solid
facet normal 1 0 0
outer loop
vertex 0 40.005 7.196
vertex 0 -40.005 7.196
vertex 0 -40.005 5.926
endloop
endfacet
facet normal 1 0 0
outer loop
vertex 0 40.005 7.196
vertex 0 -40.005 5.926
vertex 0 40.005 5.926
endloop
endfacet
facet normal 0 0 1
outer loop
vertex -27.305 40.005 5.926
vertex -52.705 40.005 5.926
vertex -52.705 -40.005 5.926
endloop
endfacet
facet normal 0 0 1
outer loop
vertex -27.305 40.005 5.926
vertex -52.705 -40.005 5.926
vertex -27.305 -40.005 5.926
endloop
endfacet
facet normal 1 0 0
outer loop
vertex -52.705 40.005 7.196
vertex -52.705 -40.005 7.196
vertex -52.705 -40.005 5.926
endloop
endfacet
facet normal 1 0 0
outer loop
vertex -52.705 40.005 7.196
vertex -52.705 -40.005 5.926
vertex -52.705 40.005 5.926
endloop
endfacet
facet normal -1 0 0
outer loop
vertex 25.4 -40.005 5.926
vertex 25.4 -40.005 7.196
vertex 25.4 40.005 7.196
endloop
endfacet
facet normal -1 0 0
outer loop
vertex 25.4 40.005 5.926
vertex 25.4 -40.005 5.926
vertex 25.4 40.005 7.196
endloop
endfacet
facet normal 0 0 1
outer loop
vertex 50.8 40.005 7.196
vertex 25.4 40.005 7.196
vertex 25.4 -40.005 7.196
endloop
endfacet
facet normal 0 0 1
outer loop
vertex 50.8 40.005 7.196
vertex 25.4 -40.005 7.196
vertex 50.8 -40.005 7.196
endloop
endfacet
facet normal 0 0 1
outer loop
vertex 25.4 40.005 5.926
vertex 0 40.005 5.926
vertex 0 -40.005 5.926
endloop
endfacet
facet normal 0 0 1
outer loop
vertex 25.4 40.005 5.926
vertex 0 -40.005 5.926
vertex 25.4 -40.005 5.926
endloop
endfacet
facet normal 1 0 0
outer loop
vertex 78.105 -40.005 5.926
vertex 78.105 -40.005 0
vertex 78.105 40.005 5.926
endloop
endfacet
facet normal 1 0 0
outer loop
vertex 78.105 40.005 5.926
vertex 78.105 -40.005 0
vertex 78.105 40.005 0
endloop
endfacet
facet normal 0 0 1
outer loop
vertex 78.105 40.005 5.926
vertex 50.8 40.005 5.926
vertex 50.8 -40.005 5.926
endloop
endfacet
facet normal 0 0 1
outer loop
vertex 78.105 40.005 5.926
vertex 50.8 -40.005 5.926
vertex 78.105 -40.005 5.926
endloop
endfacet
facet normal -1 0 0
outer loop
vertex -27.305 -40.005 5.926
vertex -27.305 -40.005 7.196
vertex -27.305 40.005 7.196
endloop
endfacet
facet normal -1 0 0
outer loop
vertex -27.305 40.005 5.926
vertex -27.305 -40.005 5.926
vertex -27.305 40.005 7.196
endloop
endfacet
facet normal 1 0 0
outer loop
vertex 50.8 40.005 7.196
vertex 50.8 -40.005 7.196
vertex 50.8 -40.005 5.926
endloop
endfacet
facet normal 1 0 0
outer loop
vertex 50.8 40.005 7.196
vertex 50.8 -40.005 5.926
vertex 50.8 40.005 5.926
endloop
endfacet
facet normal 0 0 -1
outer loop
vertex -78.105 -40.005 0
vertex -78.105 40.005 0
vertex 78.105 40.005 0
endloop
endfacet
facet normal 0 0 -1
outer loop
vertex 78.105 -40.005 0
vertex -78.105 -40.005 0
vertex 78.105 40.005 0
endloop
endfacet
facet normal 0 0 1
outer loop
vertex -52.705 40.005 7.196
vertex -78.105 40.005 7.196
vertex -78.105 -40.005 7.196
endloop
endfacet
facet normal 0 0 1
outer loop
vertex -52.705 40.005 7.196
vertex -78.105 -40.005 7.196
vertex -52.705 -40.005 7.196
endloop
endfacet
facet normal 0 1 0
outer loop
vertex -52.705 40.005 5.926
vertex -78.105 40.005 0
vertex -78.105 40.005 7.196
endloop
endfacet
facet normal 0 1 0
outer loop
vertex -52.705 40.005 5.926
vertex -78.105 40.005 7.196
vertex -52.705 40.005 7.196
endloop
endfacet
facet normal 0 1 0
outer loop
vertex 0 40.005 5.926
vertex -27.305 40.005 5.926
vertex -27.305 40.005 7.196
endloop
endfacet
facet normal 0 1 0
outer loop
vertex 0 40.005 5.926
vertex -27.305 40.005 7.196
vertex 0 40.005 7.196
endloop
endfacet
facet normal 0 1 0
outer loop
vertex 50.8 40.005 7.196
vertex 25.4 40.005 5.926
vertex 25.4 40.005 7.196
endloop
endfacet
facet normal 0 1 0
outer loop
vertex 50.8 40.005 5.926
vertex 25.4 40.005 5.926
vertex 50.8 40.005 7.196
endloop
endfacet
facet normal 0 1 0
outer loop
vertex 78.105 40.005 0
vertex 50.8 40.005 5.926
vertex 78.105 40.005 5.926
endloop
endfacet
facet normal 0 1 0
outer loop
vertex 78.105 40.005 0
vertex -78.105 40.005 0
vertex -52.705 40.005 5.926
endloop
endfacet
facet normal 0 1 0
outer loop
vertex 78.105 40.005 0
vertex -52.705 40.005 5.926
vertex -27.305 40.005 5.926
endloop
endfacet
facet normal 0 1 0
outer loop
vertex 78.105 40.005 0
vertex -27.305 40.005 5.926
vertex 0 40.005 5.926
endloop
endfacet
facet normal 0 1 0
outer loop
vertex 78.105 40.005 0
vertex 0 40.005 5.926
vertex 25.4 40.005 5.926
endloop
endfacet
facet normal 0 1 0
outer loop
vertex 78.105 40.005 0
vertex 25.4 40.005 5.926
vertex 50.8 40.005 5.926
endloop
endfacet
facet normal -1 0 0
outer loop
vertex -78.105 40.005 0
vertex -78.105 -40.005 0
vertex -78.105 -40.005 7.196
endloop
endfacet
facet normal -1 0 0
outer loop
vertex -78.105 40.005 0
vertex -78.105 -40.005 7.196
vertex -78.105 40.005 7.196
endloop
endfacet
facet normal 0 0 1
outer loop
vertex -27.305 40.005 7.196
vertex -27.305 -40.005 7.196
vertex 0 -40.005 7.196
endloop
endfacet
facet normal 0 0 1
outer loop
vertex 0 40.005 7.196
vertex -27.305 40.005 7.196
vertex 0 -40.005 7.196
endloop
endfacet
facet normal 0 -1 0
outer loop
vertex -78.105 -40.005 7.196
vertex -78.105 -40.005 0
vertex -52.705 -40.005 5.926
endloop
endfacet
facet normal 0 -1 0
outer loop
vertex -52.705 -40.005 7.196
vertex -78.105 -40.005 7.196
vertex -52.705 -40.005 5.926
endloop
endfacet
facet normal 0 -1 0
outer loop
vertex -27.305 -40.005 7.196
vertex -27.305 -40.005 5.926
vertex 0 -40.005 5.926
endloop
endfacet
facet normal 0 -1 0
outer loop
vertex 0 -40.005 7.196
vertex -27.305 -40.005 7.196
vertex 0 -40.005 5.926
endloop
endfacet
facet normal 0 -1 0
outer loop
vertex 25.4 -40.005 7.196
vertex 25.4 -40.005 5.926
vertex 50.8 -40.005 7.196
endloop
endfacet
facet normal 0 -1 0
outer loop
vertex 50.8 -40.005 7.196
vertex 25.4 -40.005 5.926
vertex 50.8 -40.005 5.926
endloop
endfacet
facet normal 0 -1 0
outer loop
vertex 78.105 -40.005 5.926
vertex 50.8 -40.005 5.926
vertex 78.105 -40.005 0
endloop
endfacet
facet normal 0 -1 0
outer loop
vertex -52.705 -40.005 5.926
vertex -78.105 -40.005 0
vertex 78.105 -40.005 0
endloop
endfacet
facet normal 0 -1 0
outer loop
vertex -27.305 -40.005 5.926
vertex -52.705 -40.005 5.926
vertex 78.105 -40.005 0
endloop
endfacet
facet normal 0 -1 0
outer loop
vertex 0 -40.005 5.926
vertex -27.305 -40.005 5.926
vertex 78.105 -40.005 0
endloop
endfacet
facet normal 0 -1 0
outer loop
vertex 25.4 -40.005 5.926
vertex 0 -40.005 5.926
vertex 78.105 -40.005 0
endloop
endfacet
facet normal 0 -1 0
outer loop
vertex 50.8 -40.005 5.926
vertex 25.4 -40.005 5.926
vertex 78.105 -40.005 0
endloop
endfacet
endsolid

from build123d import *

# Parameters (mm, degrees)
F0_W     = 156.21
F0_H     = 80.01
F1_DEPTH = 8.46582
F2_W     = 25.4
F2_H     = 80.01
F3_DEPTH = 1.27
F4_DEPTH = 2.54
F2_W_2   = 27.305
F5_DEPTH = 1.27
F6_DEPTH = 2.54
F7_DEPTH = 1.27
F8_DEPTH = 2.54


with BuildPart() as f1:
    # F0 (on Top) → F1 (new body)
    with BuildSketch(Plane.XY):
        Rectangle(F0_W, F0_H)
    extrude(amount=F1_DEPTH)

    # F2 (on face) → F3 (cut)
    with BuildSketch(Plane.XY.offset(8.46582)):
        with Locations((-65.405, 0)):
            Rectangle(F2_W, F2_H)
    extrude(amount=-F3_DEPTH, mode=Mode.SUBTRACT)

    # F2 (on face) → F4 (cut)
    with BuildSketch(Plane.XY.offset(8.46582)):
        with Locations((-40.005, 0)):
            Rectangle(F2_W, F2_H)
    extrude(amount=-F4_DEPTH, mode=Mode.SUBTRACT)

    # F2 (on face) → F5 (cut)
    with BuildSketch(Plane.XY.offset(8.46582)):
        with Locations((-13.6525, 0)):
            Rectangle(F2_W_2, F2_H)
    extrude(amount=-F5_DEPTH, mode=Mode.SUBTRACT)

    # F2 (on face) → F6 (cut)
    with BuildSketch(Plane.XY.offset(8.46582)):
        with Locations((12.7, 0)):
            Rectangle(F2_W, F2_H)
    extrude(amount=-F6_DEPTH, mode=Mode.SUBTRACT)

    # F2 (on face) → F7 (cut)
    with BuildSketch(Plane.XY.offset(8.46582)):
        with Locations((38.1, 0)):
            Rectangle(F2_W, F2_H)
    extrude(amount=-F7_DEPTH, mode=Mode.SUBTRACT)

    # F2 (on face) → F8 (cut)
    with BuildSketch(Plane.XY.offset(8.46582)):
        with Locations((64.4525, 0)):
            Rectangle(F2_W_2, F2_H)
    extrude(amount=-F8_DEPTH, mode=Mode.SUBTRACT)


solid = f1.part
